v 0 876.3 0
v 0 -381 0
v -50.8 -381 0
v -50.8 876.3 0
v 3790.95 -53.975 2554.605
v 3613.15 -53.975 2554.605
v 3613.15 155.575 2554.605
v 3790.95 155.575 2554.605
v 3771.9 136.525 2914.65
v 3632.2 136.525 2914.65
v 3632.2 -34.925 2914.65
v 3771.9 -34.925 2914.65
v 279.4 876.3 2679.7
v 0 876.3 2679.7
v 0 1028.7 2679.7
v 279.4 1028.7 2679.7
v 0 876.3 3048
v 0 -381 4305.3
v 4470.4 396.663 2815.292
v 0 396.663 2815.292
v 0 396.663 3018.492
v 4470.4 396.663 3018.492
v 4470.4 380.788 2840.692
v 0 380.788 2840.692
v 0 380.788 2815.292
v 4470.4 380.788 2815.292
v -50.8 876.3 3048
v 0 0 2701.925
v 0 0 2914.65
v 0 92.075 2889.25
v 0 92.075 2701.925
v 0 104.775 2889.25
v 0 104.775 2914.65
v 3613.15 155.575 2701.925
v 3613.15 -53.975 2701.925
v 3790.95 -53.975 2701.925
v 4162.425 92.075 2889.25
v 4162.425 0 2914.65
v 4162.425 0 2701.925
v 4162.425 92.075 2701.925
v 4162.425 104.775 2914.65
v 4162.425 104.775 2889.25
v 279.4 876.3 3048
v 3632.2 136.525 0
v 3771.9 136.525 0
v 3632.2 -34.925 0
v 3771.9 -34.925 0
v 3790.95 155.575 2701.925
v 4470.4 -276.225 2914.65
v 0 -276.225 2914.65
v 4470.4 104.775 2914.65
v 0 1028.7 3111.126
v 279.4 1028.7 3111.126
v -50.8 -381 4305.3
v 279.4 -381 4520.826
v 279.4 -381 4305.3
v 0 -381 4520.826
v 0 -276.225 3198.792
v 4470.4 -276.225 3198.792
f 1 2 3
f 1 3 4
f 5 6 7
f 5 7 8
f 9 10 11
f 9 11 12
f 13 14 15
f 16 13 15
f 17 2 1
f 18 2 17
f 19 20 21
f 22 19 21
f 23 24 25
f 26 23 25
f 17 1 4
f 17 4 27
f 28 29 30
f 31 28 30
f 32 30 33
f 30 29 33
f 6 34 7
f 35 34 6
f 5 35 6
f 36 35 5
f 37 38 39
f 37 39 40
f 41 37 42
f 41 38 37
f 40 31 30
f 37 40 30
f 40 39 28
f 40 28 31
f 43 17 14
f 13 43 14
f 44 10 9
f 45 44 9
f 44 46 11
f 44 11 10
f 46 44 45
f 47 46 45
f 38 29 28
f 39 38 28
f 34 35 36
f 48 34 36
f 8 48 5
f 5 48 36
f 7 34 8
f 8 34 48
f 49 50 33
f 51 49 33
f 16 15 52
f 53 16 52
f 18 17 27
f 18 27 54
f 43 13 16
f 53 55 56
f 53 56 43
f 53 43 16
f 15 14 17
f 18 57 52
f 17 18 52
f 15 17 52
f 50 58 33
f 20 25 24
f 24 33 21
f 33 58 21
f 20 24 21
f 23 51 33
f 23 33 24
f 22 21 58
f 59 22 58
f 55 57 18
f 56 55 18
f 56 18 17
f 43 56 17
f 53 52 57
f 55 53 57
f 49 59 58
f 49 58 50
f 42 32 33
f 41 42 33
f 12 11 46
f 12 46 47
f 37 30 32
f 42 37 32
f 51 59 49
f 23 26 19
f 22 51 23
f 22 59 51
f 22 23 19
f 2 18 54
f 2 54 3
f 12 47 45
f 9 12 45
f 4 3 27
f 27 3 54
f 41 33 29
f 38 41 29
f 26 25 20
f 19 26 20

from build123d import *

# Parameters (mm, degrees)
F1_DEPTH  = 4162.425
F2_W      = 139.7
F2_H      = 171.45
F3_DEPTH  = 2914.65
F5_DEPTH  = 4470.4
F6_W      = 177.8
F6_H      = 209.55
F7_DEPTH  = 147.32
F9_DEPTH  = 50.8
F11_DEPTH = 279.4


with BuildPart() as f1:
    # F0 (on Right) → F1 (new body)
    with BuildSketch(Plane.YZ):
        Polygon((0, 2914.65), (0, 2701.925), (92.075, 2701.925), (92.075, 2889.25), (104.775, 2889.25), (104.775, 2914.65), align=None)
    extrude(amount=F1_DEPTH)


with BuildPart() as f3:
    # F2 (on face) → F3 (new body, through all)
    with BuildSketch(Plane.XY.offset(2914.65)):
        with Locations((3702.05, 50.8)):
            Rectangle(F2_W, F2_H)
    extrude(amount=-F3_DEPTH)


with BuildPart() as f5:
    # F4 (on Right) → F5 (new body)
    with BuildSketch(Plane.YZ):
        Polygon((-276.225, 2914.65), (104.775, 2914.65), (380.788305, 2840.692458), (380.788305, 2815.292458), (396.663305, 2815.292458), (396.663305, 3018.492458), (-276.225, 3198.792336), align=None)
    extrude(amount=F5_DEPTH)


with BuildPart() as f7:
    # F6 (on face) → F7 (new body)
    with BuildSketch(Plane(origin=(0, 0, 2701.925), x_dir=(1, 0, 0), z_dir=(0, 0, -1))):
        with Locations((3702.05, -50.8)):
            Rectangle(F6_W, F6_H)
    extrude(amount=F7_DEPTH)


with BuildPart() as f9:
    # F8 (on Right) → F9 (new body)
    with BuildSketch(Plane.YZ):
        Polygon((-381, 0), (876.3, 0), (876.3, 3048), (-381, 4305.3), align=None)
    extrude(amount=-F9_DEPTH)


with BuildPart() as f11:
    # F10 (on face) → F11 (new body)
    with BuildSketch(Plane.YZ):
        Polygon((876.3, 3048), (876.3, 2679.7), (1028.7, 2679.7), (1028.7, 3111.126147), (-381, 4520.826147), (-381, 4305.3), align=None)
    extrude(amount=F11_DEPTH)


solid = Compound([f1.part, f3.part, f5.part, f7.part, f9.part, f11.part])
